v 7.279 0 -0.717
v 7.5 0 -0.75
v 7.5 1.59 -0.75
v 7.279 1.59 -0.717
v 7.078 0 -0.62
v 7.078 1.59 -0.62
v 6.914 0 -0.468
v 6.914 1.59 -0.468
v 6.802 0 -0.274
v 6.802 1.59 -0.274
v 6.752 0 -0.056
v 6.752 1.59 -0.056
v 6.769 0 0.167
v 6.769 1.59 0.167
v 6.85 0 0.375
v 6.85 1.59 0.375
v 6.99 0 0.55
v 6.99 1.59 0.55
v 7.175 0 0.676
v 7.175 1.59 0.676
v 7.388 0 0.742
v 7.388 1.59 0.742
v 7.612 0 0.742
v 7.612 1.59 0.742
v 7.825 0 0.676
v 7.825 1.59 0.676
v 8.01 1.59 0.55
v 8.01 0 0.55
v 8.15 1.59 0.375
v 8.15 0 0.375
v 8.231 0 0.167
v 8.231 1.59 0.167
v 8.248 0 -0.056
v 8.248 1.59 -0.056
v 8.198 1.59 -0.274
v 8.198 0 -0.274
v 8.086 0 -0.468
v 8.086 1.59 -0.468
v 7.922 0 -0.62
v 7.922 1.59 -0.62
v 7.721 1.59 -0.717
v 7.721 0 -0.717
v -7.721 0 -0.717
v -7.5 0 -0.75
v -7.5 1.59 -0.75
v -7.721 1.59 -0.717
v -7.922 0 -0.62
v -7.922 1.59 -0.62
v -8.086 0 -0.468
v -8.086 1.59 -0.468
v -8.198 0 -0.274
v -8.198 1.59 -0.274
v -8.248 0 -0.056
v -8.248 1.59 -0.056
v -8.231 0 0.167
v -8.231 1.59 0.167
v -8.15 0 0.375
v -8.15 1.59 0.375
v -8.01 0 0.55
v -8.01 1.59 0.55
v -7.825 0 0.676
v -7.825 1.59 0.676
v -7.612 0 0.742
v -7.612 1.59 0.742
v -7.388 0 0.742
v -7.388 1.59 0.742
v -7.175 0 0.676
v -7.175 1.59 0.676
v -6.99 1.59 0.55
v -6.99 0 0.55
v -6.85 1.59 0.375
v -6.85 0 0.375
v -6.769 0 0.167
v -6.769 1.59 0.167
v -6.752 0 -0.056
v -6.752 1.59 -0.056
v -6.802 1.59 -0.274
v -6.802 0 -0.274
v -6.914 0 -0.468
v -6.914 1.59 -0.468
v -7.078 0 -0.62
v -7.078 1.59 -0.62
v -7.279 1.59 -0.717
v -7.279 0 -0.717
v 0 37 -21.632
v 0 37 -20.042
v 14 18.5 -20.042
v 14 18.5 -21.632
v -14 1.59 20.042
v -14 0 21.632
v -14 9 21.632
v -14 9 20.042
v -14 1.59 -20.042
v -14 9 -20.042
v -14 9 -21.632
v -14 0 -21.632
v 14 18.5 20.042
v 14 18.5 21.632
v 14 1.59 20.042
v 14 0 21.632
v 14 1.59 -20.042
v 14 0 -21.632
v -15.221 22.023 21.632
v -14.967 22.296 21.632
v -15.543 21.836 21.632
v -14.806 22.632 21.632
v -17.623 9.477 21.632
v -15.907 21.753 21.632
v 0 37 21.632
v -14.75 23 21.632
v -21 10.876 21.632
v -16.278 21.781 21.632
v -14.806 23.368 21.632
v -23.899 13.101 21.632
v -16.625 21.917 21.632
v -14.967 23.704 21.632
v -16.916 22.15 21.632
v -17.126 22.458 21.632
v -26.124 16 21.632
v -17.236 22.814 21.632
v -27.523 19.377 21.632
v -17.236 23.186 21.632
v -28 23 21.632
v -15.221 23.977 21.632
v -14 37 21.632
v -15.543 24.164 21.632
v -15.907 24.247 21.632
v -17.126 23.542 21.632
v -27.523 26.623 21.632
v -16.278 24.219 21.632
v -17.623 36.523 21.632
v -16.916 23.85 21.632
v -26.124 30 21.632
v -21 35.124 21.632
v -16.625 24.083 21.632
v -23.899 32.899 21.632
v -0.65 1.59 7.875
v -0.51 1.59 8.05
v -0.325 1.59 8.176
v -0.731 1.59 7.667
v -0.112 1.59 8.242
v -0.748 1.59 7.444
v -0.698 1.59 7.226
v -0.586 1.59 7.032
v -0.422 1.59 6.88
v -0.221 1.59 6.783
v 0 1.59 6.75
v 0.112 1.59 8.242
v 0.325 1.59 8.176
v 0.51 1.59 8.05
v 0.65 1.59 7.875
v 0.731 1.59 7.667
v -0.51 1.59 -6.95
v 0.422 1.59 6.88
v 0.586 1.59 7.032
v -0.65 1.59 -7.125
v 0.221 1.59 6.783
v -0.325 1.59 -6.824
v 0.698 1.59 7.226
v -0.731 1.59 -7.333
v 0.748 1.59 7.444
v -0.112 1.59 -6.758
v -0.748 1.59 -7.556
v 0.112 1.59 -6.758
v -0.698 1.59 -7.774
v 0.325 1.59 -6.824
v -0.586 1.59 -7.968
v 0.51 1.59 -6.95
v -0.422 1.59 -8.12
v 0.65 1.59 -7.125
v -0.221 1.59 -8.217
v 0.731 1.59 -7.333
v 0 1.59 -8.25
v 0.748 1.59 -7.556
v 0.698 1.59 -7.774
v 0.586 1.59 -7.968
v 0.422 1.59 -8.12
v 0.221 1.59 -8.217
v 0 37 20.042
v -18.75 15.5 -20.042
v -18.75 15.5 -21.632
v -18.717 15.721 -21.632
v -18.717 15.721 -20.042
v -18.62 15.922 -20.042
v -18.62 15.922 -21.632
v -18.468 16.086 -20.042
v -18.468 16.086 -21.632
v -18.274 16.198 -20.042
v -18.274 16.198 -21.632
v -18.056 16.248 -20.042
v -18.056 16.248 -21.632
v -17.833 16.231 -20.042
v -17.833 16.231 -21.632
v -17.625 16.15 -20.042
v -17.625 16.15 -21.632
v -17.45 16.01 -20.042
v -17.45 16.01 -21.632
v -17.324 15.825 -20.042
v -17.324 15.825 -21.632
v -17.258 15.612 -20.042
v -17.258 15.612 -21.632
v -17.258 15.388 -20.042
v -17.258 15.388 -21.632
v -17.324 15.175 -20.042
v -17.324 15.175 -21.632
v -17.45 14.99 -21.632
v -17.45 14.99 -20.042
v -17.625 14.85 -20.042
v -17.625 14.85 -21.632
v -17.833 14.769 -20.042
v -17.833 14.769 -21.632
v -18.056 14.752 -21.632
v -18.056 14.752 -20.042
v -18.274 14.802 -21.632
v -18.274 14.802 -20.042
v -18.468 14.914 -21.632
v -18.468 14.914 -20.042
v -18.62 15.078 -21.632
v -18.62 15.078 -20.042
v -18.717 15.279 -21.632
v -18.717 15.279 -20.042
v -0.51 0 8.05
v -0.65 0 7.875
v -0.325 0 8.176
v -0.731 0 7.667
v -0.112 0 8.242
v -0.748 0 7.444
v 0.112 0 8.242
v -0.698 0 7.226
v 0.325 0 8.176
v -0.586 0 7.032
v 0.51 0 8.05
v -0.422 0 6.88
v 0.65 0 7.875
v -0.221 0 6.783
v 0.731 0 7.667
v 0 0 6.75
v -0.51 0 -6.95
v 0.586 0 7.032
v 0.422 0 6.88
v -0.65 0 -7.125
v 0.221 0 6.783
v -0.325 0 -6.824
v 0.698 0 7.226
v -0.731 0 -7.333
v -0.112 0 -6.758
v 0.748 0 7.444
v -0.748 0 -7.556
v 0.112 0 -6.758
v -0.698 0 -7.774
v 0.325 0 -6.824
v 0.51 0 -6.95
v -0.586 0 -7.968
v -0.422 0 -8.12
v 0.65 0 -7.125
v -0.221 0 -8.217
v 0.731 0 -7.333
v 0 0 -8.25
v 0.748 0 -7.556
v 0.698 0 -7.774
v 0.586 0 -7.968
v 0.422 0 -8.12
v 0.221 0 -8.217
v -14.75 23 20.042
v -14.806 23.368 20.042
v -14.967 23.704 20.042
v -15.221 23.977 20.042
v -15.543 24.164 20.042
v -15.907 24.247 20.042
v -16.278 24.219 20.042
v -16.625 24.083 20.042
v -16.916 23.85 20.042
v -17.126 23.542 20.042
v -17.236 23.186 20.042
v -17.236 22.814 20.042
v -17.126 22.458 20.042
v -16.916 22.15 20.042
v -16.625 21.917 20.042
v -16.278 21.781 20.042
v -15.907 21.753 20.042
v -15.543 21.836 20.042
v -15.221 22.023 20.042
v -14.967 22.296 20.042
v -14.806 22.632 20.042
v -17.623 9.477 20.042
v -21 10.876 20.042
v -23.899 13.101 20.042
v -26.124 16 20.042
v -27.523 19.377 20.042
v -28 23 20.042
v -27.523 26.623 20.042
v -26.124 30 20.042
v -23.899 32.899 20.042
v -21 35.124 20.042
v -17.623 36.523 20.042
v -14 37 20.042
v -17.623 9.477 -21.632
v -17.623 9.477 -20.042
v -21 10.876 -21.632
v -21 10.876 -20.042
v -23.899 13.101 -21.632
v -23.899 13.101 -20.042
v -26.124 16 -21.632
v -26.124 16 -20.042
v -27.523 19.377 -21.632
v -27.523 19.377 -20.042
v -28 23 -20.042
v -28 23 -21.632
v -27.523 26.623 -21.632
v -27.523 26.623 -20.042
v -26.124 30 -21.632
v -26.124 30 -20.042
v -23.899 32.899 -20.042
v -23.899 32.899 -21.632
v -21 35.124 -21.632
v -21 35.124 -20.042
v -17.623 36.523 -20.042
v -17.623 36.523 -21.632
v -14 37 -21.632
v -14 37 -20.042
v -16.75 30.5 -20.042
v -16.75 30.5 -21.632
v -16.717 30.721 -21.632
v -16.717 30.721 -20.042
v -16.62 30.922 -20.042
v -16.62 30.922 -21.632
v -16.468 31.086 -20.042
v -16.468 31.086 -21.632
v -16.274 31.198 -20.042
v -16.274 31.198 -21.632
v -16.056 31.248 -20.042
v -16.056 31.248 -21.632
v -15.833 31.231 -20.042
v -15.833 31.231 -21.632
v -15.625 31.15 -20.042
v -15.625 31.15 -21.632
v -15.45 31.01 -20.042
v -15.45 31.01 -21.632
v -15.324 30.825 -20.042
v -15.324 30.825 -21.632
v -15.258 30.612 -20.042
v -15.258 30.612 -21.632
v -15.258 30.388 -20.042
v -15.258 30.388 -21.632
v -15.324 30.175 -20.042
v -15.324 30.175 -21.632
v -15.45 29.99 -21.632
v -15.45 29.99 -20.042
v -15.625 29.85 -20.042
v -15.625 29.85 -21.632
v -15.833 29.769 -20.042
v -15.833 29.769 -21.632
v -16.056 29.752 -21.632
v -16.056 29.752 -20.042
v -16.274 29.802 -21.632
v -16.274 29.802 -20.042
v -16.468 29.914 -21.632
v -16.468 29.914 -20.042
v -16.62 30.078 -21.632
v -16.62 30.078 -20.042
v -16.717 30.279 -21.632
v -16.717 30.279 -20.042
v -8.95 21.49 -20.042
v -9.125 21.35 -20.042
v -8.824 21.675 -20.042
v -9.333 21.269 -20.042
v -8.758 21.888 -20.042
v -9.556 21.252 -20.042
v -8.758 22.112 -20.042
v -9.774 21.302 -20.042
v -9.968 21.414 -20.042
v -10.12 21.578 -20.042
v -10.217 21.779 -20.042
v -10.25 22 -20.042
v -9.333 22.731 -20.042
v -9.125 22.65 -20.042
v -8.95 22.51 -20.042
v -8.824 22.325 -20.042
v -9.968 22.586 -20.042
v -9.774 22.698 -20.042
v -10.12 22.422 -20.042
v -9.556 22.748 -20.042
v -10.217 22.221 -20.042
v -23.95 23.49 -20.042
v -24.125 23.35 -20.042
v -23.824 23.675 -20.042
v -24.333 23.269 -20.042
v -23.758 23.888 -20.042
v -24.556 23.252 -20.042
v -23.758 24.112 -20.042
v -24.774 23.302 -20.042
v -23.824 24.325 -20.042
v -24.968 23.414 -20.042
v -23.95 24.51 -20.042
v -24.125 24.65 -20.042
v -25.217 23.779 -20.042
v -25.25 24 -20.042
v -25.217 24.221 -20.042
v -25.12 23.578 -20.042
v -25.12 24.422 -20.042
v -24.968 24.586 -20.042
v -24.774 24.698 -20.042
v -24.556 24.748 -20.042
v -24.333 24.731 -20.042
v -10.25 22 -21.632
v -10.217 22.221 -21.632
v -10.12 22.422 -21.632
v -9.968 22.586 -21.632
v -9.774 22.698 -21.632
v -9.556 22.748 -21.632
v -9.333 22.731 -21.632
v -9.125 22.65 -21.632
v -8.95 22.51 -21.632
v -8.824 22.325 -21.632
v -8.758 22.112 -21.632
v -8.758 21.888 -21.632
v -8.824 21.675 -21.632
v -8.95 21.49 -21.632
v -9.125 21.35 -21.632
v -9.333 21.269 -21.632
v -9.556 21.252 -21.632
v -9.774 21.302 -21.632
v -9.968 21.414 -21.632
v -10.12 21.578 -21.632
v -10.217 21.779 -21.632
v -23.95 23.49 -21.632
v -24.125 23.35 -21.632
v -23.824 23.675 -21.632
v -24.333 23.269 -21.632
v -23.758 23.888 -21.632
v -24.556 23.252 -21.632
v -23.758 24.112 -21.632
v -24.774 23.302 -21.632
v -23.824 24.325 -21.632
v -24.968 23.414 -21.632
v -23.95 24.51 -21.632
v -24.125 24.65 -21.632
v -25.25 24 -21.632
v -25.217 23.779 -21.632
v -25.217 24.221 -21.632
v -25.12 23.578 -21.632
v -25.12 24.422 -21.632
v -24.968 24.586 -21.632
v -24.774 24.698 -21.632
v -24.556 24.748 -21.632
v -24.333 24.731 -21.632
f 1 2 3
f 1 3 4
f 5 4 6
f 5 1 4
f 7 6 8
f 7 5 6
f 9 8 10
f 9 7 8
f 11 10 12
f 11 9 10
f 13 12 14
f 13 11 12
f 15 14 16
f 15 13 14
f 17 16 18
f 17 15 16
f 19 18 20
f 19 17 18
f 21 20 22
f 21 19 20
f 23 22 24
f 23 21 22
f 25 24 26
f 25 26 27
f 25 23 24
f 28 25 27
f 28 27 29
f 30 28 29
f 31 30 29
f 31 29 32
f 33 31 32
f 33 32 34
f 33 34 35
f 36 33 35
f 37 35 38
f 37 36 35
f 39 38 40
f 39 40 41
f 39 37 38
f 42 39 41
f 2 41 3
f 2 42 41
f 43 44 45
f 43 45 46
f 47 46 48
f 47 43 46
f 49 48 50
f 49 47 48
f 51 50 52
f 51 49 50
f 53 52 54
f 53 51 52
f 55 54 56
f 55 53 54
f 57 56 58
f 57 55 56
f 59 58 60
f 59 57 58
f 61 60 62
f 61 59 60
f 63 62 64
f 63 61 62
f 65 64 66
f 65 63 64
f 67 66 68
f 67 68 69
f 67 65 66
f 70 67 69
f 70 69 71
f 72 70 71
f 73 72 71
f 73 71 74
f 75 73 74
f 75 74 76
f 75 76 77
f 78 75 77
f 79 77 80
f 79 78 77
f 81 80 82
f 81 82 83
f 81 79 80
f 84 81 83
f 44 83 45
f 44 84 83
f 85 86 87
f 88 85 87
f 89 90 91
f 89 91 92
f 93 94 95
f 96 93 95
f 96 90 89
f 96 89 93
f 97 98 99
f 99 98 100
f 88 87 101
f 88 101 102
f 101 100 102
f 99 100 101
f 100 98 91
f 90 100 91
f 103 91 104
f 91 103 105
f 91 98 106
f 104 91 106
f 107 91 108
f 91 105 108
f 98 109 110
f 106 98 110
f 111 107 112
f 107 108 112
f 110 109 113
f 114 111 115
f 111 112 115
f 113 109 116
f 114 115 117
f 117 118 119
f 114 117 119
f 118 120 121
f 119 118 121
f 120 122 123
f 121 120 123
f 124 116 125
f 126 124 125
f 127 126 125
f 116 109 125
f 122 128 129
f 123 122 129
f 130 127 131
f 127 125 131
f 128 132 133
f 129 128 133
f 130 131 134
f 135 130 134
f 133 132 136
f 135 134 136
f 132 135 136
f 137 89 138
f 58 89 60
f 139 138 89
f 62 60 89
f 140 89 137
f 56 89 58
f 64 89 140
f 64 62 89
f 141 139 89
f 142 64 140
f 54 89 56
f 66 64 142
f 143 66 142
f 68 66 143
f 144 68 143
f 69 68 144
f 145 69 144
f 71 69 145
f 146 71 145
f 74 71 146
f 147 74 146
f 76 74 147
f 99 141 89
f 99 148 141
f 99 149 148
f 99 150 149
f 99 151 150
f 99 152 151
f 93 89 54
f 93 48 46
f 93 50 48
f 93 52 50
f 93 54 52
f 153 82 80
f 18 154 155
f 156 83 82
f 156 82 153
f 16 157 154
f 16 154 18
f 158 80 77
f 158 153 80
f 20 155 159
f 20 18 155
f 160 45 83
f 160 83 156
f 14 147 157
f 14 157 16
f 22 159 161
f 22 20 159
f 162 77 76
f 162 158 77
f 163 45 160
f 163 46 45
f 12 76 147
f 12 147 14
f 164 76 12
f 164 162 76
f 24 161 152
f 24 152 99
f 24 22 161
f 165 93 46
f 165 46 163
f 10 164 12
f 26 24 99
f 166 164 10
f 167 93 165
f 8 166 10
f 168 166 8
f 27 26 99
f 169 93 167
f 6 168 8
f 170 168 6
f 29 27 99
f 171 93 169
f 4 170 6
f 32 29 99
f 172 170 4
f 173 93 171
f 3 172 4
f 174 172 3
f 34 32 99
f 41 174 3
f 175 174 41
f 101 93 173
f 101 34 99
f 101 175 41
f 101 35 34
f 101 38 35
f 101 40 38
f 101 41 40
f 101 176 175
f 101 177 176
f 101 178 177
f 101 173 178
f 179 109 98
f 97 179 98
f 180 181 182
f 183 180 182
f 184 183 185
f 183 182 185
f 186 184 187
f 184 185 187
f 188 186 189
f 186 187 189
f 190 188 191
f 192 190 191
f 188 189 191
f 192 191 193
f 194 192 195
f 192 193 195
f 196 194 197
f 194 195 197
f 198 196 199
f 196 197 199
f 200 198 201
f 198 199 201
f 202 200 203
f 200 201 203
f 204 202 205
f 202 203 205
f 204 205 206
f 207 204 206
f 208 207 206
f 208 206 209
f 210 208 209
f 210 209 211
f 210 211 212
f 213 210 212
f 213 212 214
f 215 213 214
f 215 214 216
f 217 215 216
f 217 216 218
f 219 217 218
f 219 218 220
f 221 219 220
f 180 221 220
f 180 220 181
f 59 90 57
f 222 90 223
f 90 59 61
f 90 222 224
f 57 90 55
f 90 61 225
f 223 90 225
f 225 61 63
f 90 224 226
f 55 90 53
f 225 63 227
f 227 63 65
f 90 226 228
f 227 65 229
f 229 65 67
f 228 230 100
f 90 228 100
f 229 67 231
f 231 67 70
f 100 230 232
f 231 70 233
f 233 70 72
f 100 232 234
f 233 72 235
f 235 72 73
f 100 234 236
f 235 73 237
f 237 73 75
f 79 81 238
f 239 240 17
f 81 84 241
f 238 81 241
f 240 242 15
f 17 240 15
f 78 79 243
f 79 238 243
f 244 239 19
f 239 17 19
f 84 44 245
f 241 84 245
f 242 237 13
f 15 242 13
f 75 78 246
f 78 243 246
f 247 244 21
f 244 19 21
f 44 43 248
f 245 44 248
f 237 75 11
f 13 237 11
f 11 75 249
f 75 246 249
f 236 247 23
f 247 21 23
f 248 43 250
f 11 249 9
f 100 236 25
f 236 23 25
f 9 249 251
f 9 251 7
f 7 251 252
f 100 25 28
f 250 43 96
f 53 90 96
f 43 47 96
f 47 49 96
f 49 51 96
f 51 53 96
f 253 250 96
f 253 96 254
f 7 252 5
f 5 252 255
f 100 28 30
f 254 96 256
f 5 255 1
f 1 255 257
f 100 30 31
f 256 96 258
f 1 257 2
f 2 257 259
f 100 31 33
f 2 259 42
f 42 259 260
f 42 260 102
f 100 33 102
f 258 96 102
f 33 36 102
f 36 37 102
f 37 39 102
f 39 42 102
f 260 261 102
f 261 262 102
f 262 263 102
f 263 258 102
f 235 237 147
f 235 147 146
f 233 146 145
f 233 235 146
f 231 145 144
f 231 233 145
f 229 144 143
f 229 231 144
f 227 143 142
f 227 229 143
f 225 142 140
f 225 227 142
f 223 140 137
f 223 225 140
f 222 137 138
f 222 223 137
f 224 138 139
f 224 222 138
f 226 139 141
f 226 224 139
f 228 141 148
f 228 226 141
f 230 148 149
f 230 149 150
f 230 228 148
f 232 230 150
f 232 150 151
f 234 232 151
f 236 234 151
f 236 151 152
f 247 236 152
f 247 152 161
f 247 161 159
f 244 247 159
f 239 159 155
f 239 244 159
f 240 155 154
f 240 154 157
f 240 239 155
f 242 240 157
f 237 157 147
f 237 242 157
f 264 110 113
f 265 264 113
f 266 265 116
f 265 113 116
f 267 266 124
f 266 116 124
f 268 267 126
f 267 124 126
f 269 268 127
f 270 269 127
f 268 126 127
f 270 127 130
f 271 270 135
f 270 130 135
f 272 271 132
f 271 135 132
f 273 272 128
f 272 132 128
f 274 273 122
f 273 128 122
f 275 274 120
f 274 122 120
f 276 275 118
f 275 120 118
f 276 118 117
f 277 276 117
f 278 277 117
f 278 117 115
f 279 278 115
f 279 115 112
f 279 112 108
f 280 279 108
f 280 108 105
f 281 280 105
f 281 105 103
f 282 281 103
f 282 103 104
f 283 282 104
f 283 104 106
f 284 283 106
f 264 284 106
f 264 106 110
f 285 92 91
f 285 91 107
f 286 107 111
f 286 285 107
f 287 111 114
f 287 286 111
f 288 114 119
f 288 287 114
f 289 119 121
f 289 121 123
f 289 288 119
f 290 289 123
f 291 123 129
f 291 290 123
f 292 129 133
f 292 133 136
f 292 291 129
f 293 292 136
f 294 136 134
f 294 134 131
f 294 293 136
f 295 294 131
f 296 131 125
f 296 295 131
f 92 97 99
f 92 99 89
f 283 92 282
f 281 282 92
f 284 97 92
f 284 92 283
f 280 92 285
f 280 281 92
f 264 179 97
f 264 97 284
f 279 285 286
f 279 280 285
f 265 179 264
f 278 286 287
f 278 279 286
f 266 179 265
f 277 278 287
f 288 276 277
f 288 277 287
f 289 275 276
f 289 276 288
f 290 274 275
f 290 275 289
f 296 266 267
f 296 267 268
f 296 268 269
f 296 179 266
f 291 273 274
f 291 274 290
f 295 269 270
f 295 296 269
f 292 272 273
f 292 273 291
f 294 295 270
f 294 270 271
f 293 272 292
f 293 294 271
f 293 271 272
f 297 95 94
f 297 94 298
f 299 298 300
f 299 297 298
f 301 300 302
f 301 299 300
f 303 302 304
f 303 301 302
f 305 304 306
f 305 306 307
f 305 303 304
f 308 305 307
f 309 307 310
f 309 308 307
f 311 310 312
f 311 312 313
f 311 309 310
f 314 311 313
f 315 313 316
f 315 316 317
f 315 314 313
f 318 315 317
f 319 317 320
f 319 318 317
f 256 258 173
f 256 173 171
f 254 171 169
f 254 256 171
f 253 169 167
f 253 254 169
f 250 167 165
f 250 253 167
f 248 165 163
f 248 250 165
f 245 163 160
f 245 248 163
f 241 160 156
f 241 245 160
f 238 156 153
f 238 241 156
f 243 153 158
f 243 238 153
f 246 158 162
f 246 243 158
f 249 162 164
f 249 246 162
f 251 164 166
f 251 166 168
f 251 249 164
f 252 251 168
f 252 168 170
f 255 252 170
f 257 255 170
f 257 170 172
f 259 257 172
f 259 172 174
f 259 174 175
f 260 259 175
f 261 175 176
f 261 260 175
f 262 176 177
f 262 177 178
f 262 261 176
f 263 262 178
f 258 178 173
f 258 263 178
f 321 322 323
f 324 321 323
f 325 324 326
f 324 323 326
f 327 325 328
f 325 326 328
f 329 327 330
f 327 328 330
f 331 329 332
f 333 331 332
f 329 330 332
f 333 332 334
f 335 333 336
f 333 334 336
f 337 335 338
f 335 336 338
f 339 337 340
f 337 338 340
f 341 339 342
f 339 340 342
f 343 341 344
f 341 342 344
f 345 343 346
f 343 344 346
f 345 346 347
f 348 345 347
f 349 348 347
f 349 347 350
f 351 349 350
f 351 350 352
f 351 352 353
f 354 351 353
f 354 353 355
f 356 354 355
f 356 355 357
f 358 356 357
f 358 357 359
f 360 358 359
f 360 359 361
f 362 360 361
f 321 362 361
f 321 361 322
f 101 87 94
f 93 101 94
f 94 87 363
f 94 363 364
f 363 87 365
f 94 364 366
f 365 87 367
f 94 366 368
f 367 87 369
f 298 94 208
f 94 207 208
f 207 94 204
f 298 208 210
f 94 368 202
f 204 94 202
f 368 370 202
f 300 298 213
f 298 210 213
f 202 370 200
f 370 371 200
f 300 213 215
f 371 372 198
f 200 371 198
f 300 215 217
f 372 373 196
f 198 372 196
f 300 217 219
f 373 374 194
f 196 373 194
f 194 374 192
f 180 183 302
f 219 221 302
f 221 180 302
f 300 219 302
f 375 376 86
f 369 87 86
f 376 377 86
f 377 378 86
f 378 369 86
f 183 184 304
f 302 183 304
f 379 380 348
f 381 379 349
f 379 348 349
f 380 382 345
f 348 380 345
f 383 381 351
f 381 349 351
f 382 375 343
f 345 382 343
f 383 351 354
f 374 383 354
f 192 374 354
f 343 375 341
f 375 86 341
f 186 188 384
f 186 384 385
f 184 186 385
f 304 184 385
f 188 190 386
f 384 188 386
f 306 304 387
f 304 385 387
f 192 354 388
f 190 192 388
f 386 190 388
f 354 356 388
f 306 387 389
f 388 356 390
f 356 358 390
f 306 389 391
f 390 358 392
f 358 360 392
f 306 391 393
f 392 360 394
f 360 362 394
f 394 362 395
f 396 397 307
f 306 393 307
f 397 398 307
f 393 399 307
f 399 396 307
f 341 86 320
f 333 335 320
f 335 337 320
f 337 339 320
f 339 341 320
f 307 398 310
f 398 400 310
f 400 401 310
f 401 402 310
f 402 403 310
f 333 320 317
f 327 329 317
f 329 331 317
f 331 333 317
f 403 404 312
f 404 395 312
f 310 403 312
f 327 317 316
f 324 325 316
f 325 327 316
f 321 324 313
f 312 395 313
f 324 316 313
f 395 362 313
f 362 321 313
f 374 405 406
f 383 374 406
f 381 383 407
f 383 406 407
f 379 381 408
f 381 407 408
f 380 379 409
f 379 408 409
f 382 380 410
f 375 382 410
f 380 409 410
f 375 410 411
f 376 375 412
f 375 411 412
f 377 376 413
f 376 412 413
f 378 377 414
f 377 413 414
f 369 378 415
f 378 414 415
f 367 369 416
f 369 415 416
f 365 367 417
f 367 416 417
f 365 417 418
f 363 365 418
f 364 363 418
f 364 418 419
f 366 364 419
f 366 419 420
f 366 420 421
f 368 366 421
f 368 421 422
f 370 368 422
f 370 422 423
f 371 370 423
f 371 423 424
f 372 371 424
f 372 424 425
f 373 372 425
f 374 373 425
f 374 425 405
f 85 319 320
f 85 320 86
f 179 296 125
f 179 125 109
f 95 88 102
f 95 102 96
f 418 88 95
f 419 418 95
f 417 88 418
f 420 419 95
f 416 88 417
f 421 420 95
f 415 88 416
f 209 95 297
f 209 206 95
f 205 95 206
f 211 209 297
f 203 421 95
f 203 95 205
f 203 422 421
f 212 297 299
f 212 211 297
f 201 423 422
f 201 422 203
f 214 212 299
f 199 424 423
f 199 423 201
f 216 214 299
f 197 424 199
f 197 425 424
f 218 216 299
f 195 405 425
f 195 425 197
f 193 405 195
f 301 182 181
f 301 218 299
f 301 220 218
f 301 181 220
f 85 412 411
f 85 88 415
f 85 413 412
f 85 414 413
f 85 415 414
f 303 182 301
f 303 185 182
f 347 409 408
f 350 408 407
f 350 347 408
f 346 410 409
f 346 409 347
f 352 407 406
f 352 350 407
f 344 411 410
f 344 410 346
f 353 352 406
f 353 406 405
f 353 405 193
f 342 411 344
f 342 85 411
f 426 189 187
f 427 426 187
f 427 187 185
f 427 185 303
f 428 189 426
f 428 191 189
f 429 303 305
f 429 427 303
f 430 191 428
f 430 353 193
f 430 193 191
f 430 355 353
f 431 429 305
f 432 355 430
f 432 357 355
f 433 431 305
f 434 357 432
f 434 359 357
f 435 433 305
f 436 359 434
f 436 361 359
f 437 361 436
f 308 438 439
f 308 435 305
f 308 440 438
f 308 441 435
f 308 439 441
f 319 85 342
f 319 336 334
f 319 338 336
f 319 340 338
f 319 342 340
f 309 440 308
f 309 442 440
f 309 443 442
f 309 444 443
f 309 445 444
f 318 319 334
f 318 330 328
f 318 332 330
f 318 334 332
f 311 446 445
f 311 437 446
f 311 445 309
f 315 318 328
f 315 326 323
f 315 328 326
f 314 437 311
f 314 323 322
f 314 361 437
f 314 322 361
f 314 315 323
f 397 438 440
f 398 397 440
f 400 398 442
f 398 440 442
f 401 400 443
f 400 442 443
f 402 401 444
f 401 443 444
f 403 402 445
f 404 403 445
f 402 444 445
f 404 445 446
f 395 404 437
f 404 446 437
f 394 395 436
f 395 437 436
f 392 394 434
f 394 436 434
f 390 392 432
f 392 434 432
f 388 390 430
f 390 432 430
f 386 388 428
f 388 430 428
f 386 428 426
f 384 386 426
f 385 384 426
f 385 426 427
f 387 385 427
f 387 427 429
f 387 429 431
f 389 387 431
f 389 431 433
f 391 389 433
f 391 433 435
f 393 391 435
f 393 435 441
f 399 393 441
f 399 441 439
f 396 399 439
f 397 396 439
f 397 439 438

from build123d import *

# Parameters (mm, degrees)
SKETCH1_W           = 28
SKETCH1_H           = 43.264
SKETCH1_R           = 0.75
BOSS_EXTRUDE1_DEPTH = 1.59
SKETCH2_W           = 28
SKETCH2_H           = 1.59
BOSS_EXTRUDE2_DEPTH = 35.41
BOSS_EXTRUDE5_DEPTH = 1.59
BOSS_EXTRUDE6_START = -1.59
BOSS_EXTRUDE6_DEPTH = 1.59
SKETCH9_R           = 0.75
CUT_EXTRUDE3_DEPTH  = 10
SKETCH10_R          = 1.25
CUT_EXTRUDE4_DEPTH  = 10
CUT_EXTRUDE5_REACH  = 65.441


with BuildPart() as part:
    # Sketch1 → Boss-Extrude1 (new body)
    with BuildSketch(Plane(origin=(0, 0, 0), x_dir=(1, 0, 0), z_dir=(0, 1, 0))):
        Rectangle(SKETCH1_W, SKETCH1_H)
        with Locations(Location((0, 7.5, 0), (0, 0, 90))):
            Circle(SKETCH1_R, mode=Mode.SUBTRACT)
        with Locations(Location((0, -7.5, 0), (0, 0, 90))):
            Circle(SKETCH1_R, mode=Mode.SUBTRACT)
        with Locations(Location((7.5, 0, 0), (0, 0, 90))):
            Circle(SKETCH1_R, mode=Mode.SUBTRACT)
        with Locations(Location((-7.5, 0, 0), (0, 0, 90))):
            Circle(SKETCH1_R, mode=Mode.SUBTRACT)
    extrude(amount=BOSS_EXTRUDE1_DEPTH)

    # Sketch2 → Boss-Extrude2 (add)
    with BuildSketch(Plane(origin=(0, 1.59, 0), x_dir=(1, 0, 0), z_dir=(0, 1, 0))):
        with Locations((0, 20.837)):
            Rectangle(SKETCH2_W, SKETCH2_H)
        with Locations((0, -20.837)):
            Rectangle(SKETCH2_W, SKETCH2_H)
    extrude(amount=BOSS_EXTRUDE2_DEPTH)

    # Sketch7 → Boss-Extrude5 (add)
    with BuildSketch(Plane(origin=(0, 0, -21.632), x_dir=(-1, 0, 0), z_dir=(0, 0, -1))):
        with BuildLine():
            Line((14, 37), (14, 9))
            ThreePointArc((14, 9), (28, 23), (14, 37))
        make_face()
    extrude(amount=-BOSS_EXTRUDE5_DEPTH)

    # Sketch8 → Boss-Extrude6 (add)
    with BuildSketch(Plane.XY.offset(21.632).offset(BOSS_EXTRUDE6_START)):
        with BuildLine():
            Line((-14, 37), (-14, 9))
            ThreePointArc((-14, 9), (-28, 23), (-14, 37))
        make_face()
    extrude(amount=BOSS_EXTRUDE6_DEPTH)

    # Sketch9 → Cut-Extrude3 (cut)
    with BuildSketch(Plane(origin=(0, 0, -21.632), x_dir=(-1, 0, 0), z_dir=(0, 0, -1))):
        with Locations((16, 30.5)):
            Circle(SKETCH9_R)
        with Locations((24.5, 24)):
            Circle(SKETCH9_R)
        with Locations((18, 15.5)):
            Circle(SKETCH9_R)
        with Locations((9.5, 22)):
            Circle(SKETCH9_R)
    extrude(amount=-CUT_EXTRUDE3_DEPTH, mode=Mode.SUBTRACT)

    # Sketch10 → Cut-Extrude4 (cut)
    with BuildSketch(Plane.XY.offset(21.632)):
        with Locations((-16, 23)):
            Circle(SKETCH10_R)
    extrude(amount=-CUT_EXTRUDE4_DEPTH, mode=Mode.SUBTRACT)

    # Cut-Extrude5: up to this face of the body (flat: up to its plane)
    cut_extrude5_end = Plane(part.part.faces().sort_by_distance((-4.502841696, 19.512586882, -21.632))[0])
    # Sketch11 → Cut-Extrude5 (cut, up to the picked face)
    with BuildSketch(Plane.XY.offset(21.632), mode=Mode.PRIVATE) as cut_extrude5_sk1:
        Polygon((0, 37), (14, 18.5), (14, 37), align=None)
    cut_extrude5_tool1 = split(extrude(cut_extrude5_sk1.sketch, amount=-CUT_EXTRUDE5_REACH, mode=Mode.PRIVATE), bisect_by=cut_extrude5_end, keep=Keep.BOTH, mode=Mode.PRIVATE)
    add(cut_extrude5_tool1.solids().sort_by(Axis((9.333333, 30.833333, 21.632), (0, 0, -1)))[0], mode=Mode.SUBTRACT)


solid = part.part
